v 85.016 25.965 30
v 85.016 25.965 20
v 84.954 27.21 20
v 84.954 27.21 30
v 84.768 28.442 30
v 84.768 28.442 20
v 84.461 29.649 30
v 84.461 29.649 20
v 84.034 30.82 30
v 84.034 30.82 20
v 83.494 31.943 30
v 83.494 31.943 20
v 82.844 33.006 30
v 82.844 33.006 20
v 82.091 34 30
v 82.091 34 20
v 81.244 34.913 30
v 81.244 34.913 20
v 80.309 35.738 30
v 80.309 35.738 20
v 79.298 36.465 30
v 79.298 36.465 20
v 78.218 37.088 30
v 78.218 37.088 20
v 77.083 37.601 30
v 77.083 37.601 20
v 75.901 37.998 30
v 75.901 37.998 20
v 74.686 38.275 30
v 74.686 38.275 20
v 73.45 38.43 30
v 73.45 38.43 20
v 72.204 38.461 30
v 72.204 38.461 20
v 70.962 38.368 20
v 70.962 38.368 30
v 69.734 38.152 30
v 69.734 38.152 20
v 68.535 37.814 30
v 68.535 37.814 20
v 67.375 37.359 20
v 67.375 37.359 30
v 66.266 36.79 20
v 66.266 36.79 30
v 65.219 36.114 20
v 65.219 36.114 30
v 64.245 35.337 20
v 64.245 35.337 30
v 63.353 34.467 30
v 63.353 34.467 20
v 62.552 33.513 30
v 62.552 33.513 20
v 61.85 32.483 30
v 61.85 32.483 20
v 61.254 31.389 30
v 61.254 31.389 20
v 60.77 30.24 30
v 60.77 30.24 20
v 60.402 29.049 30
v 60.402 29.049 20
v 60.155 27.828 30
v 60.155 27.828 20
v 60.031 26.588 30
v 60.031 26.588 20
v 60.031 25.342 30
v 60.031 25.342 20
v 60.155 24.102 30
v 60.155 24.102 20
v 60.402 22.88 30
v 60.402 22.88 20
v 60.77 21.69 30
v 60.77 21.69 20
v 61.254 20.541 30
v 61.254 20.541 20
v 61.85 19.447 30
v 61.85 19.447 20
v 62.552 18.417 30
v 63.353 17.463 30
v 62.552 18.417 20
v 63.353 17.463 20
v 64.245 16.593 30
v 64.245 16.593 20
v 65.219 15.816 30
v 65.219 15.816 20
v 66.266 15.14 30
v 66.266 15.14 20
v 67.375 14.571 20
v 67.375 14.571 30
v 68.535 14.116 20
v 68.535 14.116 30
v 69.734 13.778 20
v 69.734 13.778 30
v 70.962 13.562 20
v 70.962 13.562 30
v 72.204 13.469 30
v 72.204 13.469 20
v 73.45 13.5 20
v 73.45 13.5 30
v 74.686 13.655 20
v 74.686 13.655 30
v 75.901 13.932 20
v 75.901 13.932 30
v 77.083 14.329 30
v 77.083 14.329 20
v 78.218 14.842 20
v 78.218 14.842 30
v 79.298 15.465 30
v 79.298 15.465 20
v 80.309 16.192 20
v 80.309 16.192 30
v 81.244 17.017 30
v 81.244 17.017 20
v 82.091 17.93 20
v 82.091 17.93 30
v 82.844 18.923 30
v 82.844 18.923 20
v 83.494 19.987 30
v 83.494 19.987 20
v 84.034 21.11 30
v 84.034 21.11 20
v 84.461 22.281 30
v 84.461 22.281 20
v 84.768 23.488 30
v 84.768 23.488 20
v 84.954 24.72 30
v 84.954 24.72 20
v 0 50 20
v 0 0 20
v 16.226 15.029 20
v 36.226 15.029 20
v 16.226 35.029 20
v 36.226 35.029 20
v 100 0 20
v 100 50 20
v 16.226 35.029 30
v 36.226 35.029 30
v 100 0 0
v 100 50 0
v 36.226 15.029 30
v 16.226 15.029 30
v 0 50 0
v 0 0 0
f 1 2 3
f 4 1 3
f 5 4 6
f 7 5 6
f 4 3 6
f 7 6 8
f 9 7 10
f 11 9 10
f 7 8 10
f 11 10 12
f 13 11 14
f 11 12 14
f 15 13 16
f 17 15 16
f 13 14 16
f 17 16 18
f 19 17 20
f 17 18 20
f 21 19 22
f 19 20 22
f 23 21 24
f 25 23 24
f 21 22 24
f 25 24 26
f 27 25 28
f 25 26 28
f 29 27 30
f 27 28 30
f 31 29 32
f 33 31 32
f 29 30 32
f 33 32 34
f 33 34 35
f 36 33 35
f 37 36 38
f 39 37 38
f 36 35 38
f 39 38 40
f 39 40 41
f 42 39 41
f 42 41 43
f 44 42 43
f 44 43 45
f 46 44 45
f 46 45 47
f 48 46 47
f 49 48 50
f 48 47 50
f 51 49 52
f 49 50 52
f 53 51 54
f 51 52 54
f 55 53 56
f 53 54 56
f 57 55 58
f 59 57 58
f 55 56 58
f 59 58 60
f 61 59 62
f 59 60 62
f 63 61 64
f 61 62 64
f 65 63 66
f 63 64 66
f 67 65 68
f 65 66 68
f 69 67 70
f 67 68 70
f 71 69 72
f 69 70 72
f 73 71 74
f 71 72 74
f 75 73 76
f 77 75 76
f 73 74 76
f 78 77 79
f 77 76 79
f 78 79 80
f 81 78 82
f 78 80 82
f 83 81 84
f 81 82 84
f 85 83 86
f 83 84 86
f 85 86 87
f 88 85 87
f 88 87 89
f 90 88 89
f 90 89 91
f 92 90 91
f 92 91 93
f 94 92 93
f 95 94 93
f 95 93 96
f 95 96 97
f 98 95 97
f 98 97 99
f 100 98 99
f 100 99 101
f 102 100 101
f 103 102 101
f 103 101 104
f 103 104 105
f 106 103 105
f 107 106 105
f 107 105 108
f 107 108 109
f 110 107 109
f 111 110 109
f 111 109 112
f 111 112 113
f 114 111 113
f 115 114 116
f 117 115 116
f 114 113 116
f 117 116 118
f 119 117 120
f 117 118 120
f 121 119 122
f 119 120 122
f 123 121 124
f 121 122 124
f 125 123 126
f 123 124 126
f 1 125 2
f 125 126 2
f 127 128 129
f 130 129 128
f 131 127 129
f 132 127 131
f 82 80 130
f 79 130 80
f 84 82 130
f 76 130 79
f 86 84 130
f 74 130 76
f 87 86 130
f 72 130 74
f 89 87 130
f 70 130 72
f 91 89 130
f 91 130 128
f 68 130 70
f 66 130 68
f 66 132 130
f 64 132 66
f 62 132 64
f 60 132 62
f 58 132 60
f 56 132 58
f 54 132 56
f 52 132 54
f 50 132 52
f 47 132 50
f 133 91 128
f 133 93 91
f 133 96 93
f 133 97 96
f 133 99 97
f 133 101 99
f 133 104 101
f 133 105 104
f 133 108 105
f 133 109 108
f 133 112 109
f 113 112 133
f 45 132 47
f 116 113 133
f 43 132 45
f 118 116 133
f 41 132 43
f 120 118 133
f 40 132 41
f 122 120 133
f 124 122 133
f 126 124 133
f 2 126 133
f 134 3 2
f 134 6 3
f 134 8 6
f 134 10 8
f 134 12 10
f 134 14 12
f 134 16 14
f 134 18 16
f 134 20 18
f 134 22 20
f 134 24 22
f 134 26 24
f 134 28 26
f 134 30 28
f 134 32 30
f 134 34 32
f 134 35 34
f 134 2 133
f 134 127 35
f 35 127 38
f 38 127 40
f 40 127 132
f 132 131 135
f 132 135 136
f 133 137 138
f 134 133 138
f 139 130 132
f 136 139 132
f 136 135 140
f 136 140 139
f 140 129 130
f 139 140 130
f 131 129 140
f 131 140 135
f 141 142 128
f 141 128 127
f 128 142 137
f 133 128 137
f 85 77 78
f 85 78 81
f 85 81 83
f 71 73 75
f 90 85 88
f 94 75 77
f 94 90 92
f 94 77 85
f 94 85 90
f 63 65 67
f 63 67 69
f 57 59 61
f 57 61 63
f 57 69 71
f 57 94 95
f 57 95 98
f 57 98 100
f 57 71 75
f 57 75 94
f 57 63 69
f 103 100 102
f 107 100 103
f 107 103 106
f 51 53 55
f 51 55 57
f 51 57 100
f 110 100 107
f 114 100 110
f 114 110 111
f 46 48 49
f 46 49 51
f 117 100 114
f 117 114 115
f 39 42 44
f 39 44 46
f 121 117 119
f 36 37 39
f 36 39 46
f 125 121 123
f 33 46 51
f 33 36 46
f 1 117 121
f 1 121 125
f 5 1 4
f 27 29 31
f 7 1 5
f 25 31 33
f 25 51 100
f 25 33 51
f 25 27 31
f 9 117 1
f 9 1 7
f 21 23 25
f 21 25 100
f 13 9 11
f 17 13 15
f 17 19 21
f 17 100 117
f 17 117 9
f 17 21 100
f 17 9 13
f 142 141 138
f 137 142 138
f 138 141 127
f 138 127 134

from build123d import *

# Parameters (mm, degrees)
SKETCH1_W           = 100
SKETCH1_H           = 50
BOSS_EXTRUDE1_DEPTH = 20
SKETCH2_R           = 12.5
SKETCH2_W           = 20
SKETCH2_H           = 20
BOSS_EXTRUDE2_DEPTH = 10


with BuildPart() as part:
    # Sketch1 → Boss-Extrude1 (new body)
    with BuildSketch(Plane.XY):
        with Locations((50, 25)):
            Rectangle(SKETCH1_W, SKETCH1_H)
    extrude(amount=BOSS_EXTRUDE1_DEPTH)

    # Sketch2 → Boss-Extrude2 (add)
    with BuildSketch(Plane.XY.offset(20)):
        with Locations((72.515853305, 25.964965142)):
            Circle(SKETCH2_R)
        with Locations((26.226220042, 25.028693536)):
            Rectangle(SKETCH2_W, SKETCH2_H)
    extrude(amount=BOSS_EXTRUDE2_DEPTH)


solid = part.part
